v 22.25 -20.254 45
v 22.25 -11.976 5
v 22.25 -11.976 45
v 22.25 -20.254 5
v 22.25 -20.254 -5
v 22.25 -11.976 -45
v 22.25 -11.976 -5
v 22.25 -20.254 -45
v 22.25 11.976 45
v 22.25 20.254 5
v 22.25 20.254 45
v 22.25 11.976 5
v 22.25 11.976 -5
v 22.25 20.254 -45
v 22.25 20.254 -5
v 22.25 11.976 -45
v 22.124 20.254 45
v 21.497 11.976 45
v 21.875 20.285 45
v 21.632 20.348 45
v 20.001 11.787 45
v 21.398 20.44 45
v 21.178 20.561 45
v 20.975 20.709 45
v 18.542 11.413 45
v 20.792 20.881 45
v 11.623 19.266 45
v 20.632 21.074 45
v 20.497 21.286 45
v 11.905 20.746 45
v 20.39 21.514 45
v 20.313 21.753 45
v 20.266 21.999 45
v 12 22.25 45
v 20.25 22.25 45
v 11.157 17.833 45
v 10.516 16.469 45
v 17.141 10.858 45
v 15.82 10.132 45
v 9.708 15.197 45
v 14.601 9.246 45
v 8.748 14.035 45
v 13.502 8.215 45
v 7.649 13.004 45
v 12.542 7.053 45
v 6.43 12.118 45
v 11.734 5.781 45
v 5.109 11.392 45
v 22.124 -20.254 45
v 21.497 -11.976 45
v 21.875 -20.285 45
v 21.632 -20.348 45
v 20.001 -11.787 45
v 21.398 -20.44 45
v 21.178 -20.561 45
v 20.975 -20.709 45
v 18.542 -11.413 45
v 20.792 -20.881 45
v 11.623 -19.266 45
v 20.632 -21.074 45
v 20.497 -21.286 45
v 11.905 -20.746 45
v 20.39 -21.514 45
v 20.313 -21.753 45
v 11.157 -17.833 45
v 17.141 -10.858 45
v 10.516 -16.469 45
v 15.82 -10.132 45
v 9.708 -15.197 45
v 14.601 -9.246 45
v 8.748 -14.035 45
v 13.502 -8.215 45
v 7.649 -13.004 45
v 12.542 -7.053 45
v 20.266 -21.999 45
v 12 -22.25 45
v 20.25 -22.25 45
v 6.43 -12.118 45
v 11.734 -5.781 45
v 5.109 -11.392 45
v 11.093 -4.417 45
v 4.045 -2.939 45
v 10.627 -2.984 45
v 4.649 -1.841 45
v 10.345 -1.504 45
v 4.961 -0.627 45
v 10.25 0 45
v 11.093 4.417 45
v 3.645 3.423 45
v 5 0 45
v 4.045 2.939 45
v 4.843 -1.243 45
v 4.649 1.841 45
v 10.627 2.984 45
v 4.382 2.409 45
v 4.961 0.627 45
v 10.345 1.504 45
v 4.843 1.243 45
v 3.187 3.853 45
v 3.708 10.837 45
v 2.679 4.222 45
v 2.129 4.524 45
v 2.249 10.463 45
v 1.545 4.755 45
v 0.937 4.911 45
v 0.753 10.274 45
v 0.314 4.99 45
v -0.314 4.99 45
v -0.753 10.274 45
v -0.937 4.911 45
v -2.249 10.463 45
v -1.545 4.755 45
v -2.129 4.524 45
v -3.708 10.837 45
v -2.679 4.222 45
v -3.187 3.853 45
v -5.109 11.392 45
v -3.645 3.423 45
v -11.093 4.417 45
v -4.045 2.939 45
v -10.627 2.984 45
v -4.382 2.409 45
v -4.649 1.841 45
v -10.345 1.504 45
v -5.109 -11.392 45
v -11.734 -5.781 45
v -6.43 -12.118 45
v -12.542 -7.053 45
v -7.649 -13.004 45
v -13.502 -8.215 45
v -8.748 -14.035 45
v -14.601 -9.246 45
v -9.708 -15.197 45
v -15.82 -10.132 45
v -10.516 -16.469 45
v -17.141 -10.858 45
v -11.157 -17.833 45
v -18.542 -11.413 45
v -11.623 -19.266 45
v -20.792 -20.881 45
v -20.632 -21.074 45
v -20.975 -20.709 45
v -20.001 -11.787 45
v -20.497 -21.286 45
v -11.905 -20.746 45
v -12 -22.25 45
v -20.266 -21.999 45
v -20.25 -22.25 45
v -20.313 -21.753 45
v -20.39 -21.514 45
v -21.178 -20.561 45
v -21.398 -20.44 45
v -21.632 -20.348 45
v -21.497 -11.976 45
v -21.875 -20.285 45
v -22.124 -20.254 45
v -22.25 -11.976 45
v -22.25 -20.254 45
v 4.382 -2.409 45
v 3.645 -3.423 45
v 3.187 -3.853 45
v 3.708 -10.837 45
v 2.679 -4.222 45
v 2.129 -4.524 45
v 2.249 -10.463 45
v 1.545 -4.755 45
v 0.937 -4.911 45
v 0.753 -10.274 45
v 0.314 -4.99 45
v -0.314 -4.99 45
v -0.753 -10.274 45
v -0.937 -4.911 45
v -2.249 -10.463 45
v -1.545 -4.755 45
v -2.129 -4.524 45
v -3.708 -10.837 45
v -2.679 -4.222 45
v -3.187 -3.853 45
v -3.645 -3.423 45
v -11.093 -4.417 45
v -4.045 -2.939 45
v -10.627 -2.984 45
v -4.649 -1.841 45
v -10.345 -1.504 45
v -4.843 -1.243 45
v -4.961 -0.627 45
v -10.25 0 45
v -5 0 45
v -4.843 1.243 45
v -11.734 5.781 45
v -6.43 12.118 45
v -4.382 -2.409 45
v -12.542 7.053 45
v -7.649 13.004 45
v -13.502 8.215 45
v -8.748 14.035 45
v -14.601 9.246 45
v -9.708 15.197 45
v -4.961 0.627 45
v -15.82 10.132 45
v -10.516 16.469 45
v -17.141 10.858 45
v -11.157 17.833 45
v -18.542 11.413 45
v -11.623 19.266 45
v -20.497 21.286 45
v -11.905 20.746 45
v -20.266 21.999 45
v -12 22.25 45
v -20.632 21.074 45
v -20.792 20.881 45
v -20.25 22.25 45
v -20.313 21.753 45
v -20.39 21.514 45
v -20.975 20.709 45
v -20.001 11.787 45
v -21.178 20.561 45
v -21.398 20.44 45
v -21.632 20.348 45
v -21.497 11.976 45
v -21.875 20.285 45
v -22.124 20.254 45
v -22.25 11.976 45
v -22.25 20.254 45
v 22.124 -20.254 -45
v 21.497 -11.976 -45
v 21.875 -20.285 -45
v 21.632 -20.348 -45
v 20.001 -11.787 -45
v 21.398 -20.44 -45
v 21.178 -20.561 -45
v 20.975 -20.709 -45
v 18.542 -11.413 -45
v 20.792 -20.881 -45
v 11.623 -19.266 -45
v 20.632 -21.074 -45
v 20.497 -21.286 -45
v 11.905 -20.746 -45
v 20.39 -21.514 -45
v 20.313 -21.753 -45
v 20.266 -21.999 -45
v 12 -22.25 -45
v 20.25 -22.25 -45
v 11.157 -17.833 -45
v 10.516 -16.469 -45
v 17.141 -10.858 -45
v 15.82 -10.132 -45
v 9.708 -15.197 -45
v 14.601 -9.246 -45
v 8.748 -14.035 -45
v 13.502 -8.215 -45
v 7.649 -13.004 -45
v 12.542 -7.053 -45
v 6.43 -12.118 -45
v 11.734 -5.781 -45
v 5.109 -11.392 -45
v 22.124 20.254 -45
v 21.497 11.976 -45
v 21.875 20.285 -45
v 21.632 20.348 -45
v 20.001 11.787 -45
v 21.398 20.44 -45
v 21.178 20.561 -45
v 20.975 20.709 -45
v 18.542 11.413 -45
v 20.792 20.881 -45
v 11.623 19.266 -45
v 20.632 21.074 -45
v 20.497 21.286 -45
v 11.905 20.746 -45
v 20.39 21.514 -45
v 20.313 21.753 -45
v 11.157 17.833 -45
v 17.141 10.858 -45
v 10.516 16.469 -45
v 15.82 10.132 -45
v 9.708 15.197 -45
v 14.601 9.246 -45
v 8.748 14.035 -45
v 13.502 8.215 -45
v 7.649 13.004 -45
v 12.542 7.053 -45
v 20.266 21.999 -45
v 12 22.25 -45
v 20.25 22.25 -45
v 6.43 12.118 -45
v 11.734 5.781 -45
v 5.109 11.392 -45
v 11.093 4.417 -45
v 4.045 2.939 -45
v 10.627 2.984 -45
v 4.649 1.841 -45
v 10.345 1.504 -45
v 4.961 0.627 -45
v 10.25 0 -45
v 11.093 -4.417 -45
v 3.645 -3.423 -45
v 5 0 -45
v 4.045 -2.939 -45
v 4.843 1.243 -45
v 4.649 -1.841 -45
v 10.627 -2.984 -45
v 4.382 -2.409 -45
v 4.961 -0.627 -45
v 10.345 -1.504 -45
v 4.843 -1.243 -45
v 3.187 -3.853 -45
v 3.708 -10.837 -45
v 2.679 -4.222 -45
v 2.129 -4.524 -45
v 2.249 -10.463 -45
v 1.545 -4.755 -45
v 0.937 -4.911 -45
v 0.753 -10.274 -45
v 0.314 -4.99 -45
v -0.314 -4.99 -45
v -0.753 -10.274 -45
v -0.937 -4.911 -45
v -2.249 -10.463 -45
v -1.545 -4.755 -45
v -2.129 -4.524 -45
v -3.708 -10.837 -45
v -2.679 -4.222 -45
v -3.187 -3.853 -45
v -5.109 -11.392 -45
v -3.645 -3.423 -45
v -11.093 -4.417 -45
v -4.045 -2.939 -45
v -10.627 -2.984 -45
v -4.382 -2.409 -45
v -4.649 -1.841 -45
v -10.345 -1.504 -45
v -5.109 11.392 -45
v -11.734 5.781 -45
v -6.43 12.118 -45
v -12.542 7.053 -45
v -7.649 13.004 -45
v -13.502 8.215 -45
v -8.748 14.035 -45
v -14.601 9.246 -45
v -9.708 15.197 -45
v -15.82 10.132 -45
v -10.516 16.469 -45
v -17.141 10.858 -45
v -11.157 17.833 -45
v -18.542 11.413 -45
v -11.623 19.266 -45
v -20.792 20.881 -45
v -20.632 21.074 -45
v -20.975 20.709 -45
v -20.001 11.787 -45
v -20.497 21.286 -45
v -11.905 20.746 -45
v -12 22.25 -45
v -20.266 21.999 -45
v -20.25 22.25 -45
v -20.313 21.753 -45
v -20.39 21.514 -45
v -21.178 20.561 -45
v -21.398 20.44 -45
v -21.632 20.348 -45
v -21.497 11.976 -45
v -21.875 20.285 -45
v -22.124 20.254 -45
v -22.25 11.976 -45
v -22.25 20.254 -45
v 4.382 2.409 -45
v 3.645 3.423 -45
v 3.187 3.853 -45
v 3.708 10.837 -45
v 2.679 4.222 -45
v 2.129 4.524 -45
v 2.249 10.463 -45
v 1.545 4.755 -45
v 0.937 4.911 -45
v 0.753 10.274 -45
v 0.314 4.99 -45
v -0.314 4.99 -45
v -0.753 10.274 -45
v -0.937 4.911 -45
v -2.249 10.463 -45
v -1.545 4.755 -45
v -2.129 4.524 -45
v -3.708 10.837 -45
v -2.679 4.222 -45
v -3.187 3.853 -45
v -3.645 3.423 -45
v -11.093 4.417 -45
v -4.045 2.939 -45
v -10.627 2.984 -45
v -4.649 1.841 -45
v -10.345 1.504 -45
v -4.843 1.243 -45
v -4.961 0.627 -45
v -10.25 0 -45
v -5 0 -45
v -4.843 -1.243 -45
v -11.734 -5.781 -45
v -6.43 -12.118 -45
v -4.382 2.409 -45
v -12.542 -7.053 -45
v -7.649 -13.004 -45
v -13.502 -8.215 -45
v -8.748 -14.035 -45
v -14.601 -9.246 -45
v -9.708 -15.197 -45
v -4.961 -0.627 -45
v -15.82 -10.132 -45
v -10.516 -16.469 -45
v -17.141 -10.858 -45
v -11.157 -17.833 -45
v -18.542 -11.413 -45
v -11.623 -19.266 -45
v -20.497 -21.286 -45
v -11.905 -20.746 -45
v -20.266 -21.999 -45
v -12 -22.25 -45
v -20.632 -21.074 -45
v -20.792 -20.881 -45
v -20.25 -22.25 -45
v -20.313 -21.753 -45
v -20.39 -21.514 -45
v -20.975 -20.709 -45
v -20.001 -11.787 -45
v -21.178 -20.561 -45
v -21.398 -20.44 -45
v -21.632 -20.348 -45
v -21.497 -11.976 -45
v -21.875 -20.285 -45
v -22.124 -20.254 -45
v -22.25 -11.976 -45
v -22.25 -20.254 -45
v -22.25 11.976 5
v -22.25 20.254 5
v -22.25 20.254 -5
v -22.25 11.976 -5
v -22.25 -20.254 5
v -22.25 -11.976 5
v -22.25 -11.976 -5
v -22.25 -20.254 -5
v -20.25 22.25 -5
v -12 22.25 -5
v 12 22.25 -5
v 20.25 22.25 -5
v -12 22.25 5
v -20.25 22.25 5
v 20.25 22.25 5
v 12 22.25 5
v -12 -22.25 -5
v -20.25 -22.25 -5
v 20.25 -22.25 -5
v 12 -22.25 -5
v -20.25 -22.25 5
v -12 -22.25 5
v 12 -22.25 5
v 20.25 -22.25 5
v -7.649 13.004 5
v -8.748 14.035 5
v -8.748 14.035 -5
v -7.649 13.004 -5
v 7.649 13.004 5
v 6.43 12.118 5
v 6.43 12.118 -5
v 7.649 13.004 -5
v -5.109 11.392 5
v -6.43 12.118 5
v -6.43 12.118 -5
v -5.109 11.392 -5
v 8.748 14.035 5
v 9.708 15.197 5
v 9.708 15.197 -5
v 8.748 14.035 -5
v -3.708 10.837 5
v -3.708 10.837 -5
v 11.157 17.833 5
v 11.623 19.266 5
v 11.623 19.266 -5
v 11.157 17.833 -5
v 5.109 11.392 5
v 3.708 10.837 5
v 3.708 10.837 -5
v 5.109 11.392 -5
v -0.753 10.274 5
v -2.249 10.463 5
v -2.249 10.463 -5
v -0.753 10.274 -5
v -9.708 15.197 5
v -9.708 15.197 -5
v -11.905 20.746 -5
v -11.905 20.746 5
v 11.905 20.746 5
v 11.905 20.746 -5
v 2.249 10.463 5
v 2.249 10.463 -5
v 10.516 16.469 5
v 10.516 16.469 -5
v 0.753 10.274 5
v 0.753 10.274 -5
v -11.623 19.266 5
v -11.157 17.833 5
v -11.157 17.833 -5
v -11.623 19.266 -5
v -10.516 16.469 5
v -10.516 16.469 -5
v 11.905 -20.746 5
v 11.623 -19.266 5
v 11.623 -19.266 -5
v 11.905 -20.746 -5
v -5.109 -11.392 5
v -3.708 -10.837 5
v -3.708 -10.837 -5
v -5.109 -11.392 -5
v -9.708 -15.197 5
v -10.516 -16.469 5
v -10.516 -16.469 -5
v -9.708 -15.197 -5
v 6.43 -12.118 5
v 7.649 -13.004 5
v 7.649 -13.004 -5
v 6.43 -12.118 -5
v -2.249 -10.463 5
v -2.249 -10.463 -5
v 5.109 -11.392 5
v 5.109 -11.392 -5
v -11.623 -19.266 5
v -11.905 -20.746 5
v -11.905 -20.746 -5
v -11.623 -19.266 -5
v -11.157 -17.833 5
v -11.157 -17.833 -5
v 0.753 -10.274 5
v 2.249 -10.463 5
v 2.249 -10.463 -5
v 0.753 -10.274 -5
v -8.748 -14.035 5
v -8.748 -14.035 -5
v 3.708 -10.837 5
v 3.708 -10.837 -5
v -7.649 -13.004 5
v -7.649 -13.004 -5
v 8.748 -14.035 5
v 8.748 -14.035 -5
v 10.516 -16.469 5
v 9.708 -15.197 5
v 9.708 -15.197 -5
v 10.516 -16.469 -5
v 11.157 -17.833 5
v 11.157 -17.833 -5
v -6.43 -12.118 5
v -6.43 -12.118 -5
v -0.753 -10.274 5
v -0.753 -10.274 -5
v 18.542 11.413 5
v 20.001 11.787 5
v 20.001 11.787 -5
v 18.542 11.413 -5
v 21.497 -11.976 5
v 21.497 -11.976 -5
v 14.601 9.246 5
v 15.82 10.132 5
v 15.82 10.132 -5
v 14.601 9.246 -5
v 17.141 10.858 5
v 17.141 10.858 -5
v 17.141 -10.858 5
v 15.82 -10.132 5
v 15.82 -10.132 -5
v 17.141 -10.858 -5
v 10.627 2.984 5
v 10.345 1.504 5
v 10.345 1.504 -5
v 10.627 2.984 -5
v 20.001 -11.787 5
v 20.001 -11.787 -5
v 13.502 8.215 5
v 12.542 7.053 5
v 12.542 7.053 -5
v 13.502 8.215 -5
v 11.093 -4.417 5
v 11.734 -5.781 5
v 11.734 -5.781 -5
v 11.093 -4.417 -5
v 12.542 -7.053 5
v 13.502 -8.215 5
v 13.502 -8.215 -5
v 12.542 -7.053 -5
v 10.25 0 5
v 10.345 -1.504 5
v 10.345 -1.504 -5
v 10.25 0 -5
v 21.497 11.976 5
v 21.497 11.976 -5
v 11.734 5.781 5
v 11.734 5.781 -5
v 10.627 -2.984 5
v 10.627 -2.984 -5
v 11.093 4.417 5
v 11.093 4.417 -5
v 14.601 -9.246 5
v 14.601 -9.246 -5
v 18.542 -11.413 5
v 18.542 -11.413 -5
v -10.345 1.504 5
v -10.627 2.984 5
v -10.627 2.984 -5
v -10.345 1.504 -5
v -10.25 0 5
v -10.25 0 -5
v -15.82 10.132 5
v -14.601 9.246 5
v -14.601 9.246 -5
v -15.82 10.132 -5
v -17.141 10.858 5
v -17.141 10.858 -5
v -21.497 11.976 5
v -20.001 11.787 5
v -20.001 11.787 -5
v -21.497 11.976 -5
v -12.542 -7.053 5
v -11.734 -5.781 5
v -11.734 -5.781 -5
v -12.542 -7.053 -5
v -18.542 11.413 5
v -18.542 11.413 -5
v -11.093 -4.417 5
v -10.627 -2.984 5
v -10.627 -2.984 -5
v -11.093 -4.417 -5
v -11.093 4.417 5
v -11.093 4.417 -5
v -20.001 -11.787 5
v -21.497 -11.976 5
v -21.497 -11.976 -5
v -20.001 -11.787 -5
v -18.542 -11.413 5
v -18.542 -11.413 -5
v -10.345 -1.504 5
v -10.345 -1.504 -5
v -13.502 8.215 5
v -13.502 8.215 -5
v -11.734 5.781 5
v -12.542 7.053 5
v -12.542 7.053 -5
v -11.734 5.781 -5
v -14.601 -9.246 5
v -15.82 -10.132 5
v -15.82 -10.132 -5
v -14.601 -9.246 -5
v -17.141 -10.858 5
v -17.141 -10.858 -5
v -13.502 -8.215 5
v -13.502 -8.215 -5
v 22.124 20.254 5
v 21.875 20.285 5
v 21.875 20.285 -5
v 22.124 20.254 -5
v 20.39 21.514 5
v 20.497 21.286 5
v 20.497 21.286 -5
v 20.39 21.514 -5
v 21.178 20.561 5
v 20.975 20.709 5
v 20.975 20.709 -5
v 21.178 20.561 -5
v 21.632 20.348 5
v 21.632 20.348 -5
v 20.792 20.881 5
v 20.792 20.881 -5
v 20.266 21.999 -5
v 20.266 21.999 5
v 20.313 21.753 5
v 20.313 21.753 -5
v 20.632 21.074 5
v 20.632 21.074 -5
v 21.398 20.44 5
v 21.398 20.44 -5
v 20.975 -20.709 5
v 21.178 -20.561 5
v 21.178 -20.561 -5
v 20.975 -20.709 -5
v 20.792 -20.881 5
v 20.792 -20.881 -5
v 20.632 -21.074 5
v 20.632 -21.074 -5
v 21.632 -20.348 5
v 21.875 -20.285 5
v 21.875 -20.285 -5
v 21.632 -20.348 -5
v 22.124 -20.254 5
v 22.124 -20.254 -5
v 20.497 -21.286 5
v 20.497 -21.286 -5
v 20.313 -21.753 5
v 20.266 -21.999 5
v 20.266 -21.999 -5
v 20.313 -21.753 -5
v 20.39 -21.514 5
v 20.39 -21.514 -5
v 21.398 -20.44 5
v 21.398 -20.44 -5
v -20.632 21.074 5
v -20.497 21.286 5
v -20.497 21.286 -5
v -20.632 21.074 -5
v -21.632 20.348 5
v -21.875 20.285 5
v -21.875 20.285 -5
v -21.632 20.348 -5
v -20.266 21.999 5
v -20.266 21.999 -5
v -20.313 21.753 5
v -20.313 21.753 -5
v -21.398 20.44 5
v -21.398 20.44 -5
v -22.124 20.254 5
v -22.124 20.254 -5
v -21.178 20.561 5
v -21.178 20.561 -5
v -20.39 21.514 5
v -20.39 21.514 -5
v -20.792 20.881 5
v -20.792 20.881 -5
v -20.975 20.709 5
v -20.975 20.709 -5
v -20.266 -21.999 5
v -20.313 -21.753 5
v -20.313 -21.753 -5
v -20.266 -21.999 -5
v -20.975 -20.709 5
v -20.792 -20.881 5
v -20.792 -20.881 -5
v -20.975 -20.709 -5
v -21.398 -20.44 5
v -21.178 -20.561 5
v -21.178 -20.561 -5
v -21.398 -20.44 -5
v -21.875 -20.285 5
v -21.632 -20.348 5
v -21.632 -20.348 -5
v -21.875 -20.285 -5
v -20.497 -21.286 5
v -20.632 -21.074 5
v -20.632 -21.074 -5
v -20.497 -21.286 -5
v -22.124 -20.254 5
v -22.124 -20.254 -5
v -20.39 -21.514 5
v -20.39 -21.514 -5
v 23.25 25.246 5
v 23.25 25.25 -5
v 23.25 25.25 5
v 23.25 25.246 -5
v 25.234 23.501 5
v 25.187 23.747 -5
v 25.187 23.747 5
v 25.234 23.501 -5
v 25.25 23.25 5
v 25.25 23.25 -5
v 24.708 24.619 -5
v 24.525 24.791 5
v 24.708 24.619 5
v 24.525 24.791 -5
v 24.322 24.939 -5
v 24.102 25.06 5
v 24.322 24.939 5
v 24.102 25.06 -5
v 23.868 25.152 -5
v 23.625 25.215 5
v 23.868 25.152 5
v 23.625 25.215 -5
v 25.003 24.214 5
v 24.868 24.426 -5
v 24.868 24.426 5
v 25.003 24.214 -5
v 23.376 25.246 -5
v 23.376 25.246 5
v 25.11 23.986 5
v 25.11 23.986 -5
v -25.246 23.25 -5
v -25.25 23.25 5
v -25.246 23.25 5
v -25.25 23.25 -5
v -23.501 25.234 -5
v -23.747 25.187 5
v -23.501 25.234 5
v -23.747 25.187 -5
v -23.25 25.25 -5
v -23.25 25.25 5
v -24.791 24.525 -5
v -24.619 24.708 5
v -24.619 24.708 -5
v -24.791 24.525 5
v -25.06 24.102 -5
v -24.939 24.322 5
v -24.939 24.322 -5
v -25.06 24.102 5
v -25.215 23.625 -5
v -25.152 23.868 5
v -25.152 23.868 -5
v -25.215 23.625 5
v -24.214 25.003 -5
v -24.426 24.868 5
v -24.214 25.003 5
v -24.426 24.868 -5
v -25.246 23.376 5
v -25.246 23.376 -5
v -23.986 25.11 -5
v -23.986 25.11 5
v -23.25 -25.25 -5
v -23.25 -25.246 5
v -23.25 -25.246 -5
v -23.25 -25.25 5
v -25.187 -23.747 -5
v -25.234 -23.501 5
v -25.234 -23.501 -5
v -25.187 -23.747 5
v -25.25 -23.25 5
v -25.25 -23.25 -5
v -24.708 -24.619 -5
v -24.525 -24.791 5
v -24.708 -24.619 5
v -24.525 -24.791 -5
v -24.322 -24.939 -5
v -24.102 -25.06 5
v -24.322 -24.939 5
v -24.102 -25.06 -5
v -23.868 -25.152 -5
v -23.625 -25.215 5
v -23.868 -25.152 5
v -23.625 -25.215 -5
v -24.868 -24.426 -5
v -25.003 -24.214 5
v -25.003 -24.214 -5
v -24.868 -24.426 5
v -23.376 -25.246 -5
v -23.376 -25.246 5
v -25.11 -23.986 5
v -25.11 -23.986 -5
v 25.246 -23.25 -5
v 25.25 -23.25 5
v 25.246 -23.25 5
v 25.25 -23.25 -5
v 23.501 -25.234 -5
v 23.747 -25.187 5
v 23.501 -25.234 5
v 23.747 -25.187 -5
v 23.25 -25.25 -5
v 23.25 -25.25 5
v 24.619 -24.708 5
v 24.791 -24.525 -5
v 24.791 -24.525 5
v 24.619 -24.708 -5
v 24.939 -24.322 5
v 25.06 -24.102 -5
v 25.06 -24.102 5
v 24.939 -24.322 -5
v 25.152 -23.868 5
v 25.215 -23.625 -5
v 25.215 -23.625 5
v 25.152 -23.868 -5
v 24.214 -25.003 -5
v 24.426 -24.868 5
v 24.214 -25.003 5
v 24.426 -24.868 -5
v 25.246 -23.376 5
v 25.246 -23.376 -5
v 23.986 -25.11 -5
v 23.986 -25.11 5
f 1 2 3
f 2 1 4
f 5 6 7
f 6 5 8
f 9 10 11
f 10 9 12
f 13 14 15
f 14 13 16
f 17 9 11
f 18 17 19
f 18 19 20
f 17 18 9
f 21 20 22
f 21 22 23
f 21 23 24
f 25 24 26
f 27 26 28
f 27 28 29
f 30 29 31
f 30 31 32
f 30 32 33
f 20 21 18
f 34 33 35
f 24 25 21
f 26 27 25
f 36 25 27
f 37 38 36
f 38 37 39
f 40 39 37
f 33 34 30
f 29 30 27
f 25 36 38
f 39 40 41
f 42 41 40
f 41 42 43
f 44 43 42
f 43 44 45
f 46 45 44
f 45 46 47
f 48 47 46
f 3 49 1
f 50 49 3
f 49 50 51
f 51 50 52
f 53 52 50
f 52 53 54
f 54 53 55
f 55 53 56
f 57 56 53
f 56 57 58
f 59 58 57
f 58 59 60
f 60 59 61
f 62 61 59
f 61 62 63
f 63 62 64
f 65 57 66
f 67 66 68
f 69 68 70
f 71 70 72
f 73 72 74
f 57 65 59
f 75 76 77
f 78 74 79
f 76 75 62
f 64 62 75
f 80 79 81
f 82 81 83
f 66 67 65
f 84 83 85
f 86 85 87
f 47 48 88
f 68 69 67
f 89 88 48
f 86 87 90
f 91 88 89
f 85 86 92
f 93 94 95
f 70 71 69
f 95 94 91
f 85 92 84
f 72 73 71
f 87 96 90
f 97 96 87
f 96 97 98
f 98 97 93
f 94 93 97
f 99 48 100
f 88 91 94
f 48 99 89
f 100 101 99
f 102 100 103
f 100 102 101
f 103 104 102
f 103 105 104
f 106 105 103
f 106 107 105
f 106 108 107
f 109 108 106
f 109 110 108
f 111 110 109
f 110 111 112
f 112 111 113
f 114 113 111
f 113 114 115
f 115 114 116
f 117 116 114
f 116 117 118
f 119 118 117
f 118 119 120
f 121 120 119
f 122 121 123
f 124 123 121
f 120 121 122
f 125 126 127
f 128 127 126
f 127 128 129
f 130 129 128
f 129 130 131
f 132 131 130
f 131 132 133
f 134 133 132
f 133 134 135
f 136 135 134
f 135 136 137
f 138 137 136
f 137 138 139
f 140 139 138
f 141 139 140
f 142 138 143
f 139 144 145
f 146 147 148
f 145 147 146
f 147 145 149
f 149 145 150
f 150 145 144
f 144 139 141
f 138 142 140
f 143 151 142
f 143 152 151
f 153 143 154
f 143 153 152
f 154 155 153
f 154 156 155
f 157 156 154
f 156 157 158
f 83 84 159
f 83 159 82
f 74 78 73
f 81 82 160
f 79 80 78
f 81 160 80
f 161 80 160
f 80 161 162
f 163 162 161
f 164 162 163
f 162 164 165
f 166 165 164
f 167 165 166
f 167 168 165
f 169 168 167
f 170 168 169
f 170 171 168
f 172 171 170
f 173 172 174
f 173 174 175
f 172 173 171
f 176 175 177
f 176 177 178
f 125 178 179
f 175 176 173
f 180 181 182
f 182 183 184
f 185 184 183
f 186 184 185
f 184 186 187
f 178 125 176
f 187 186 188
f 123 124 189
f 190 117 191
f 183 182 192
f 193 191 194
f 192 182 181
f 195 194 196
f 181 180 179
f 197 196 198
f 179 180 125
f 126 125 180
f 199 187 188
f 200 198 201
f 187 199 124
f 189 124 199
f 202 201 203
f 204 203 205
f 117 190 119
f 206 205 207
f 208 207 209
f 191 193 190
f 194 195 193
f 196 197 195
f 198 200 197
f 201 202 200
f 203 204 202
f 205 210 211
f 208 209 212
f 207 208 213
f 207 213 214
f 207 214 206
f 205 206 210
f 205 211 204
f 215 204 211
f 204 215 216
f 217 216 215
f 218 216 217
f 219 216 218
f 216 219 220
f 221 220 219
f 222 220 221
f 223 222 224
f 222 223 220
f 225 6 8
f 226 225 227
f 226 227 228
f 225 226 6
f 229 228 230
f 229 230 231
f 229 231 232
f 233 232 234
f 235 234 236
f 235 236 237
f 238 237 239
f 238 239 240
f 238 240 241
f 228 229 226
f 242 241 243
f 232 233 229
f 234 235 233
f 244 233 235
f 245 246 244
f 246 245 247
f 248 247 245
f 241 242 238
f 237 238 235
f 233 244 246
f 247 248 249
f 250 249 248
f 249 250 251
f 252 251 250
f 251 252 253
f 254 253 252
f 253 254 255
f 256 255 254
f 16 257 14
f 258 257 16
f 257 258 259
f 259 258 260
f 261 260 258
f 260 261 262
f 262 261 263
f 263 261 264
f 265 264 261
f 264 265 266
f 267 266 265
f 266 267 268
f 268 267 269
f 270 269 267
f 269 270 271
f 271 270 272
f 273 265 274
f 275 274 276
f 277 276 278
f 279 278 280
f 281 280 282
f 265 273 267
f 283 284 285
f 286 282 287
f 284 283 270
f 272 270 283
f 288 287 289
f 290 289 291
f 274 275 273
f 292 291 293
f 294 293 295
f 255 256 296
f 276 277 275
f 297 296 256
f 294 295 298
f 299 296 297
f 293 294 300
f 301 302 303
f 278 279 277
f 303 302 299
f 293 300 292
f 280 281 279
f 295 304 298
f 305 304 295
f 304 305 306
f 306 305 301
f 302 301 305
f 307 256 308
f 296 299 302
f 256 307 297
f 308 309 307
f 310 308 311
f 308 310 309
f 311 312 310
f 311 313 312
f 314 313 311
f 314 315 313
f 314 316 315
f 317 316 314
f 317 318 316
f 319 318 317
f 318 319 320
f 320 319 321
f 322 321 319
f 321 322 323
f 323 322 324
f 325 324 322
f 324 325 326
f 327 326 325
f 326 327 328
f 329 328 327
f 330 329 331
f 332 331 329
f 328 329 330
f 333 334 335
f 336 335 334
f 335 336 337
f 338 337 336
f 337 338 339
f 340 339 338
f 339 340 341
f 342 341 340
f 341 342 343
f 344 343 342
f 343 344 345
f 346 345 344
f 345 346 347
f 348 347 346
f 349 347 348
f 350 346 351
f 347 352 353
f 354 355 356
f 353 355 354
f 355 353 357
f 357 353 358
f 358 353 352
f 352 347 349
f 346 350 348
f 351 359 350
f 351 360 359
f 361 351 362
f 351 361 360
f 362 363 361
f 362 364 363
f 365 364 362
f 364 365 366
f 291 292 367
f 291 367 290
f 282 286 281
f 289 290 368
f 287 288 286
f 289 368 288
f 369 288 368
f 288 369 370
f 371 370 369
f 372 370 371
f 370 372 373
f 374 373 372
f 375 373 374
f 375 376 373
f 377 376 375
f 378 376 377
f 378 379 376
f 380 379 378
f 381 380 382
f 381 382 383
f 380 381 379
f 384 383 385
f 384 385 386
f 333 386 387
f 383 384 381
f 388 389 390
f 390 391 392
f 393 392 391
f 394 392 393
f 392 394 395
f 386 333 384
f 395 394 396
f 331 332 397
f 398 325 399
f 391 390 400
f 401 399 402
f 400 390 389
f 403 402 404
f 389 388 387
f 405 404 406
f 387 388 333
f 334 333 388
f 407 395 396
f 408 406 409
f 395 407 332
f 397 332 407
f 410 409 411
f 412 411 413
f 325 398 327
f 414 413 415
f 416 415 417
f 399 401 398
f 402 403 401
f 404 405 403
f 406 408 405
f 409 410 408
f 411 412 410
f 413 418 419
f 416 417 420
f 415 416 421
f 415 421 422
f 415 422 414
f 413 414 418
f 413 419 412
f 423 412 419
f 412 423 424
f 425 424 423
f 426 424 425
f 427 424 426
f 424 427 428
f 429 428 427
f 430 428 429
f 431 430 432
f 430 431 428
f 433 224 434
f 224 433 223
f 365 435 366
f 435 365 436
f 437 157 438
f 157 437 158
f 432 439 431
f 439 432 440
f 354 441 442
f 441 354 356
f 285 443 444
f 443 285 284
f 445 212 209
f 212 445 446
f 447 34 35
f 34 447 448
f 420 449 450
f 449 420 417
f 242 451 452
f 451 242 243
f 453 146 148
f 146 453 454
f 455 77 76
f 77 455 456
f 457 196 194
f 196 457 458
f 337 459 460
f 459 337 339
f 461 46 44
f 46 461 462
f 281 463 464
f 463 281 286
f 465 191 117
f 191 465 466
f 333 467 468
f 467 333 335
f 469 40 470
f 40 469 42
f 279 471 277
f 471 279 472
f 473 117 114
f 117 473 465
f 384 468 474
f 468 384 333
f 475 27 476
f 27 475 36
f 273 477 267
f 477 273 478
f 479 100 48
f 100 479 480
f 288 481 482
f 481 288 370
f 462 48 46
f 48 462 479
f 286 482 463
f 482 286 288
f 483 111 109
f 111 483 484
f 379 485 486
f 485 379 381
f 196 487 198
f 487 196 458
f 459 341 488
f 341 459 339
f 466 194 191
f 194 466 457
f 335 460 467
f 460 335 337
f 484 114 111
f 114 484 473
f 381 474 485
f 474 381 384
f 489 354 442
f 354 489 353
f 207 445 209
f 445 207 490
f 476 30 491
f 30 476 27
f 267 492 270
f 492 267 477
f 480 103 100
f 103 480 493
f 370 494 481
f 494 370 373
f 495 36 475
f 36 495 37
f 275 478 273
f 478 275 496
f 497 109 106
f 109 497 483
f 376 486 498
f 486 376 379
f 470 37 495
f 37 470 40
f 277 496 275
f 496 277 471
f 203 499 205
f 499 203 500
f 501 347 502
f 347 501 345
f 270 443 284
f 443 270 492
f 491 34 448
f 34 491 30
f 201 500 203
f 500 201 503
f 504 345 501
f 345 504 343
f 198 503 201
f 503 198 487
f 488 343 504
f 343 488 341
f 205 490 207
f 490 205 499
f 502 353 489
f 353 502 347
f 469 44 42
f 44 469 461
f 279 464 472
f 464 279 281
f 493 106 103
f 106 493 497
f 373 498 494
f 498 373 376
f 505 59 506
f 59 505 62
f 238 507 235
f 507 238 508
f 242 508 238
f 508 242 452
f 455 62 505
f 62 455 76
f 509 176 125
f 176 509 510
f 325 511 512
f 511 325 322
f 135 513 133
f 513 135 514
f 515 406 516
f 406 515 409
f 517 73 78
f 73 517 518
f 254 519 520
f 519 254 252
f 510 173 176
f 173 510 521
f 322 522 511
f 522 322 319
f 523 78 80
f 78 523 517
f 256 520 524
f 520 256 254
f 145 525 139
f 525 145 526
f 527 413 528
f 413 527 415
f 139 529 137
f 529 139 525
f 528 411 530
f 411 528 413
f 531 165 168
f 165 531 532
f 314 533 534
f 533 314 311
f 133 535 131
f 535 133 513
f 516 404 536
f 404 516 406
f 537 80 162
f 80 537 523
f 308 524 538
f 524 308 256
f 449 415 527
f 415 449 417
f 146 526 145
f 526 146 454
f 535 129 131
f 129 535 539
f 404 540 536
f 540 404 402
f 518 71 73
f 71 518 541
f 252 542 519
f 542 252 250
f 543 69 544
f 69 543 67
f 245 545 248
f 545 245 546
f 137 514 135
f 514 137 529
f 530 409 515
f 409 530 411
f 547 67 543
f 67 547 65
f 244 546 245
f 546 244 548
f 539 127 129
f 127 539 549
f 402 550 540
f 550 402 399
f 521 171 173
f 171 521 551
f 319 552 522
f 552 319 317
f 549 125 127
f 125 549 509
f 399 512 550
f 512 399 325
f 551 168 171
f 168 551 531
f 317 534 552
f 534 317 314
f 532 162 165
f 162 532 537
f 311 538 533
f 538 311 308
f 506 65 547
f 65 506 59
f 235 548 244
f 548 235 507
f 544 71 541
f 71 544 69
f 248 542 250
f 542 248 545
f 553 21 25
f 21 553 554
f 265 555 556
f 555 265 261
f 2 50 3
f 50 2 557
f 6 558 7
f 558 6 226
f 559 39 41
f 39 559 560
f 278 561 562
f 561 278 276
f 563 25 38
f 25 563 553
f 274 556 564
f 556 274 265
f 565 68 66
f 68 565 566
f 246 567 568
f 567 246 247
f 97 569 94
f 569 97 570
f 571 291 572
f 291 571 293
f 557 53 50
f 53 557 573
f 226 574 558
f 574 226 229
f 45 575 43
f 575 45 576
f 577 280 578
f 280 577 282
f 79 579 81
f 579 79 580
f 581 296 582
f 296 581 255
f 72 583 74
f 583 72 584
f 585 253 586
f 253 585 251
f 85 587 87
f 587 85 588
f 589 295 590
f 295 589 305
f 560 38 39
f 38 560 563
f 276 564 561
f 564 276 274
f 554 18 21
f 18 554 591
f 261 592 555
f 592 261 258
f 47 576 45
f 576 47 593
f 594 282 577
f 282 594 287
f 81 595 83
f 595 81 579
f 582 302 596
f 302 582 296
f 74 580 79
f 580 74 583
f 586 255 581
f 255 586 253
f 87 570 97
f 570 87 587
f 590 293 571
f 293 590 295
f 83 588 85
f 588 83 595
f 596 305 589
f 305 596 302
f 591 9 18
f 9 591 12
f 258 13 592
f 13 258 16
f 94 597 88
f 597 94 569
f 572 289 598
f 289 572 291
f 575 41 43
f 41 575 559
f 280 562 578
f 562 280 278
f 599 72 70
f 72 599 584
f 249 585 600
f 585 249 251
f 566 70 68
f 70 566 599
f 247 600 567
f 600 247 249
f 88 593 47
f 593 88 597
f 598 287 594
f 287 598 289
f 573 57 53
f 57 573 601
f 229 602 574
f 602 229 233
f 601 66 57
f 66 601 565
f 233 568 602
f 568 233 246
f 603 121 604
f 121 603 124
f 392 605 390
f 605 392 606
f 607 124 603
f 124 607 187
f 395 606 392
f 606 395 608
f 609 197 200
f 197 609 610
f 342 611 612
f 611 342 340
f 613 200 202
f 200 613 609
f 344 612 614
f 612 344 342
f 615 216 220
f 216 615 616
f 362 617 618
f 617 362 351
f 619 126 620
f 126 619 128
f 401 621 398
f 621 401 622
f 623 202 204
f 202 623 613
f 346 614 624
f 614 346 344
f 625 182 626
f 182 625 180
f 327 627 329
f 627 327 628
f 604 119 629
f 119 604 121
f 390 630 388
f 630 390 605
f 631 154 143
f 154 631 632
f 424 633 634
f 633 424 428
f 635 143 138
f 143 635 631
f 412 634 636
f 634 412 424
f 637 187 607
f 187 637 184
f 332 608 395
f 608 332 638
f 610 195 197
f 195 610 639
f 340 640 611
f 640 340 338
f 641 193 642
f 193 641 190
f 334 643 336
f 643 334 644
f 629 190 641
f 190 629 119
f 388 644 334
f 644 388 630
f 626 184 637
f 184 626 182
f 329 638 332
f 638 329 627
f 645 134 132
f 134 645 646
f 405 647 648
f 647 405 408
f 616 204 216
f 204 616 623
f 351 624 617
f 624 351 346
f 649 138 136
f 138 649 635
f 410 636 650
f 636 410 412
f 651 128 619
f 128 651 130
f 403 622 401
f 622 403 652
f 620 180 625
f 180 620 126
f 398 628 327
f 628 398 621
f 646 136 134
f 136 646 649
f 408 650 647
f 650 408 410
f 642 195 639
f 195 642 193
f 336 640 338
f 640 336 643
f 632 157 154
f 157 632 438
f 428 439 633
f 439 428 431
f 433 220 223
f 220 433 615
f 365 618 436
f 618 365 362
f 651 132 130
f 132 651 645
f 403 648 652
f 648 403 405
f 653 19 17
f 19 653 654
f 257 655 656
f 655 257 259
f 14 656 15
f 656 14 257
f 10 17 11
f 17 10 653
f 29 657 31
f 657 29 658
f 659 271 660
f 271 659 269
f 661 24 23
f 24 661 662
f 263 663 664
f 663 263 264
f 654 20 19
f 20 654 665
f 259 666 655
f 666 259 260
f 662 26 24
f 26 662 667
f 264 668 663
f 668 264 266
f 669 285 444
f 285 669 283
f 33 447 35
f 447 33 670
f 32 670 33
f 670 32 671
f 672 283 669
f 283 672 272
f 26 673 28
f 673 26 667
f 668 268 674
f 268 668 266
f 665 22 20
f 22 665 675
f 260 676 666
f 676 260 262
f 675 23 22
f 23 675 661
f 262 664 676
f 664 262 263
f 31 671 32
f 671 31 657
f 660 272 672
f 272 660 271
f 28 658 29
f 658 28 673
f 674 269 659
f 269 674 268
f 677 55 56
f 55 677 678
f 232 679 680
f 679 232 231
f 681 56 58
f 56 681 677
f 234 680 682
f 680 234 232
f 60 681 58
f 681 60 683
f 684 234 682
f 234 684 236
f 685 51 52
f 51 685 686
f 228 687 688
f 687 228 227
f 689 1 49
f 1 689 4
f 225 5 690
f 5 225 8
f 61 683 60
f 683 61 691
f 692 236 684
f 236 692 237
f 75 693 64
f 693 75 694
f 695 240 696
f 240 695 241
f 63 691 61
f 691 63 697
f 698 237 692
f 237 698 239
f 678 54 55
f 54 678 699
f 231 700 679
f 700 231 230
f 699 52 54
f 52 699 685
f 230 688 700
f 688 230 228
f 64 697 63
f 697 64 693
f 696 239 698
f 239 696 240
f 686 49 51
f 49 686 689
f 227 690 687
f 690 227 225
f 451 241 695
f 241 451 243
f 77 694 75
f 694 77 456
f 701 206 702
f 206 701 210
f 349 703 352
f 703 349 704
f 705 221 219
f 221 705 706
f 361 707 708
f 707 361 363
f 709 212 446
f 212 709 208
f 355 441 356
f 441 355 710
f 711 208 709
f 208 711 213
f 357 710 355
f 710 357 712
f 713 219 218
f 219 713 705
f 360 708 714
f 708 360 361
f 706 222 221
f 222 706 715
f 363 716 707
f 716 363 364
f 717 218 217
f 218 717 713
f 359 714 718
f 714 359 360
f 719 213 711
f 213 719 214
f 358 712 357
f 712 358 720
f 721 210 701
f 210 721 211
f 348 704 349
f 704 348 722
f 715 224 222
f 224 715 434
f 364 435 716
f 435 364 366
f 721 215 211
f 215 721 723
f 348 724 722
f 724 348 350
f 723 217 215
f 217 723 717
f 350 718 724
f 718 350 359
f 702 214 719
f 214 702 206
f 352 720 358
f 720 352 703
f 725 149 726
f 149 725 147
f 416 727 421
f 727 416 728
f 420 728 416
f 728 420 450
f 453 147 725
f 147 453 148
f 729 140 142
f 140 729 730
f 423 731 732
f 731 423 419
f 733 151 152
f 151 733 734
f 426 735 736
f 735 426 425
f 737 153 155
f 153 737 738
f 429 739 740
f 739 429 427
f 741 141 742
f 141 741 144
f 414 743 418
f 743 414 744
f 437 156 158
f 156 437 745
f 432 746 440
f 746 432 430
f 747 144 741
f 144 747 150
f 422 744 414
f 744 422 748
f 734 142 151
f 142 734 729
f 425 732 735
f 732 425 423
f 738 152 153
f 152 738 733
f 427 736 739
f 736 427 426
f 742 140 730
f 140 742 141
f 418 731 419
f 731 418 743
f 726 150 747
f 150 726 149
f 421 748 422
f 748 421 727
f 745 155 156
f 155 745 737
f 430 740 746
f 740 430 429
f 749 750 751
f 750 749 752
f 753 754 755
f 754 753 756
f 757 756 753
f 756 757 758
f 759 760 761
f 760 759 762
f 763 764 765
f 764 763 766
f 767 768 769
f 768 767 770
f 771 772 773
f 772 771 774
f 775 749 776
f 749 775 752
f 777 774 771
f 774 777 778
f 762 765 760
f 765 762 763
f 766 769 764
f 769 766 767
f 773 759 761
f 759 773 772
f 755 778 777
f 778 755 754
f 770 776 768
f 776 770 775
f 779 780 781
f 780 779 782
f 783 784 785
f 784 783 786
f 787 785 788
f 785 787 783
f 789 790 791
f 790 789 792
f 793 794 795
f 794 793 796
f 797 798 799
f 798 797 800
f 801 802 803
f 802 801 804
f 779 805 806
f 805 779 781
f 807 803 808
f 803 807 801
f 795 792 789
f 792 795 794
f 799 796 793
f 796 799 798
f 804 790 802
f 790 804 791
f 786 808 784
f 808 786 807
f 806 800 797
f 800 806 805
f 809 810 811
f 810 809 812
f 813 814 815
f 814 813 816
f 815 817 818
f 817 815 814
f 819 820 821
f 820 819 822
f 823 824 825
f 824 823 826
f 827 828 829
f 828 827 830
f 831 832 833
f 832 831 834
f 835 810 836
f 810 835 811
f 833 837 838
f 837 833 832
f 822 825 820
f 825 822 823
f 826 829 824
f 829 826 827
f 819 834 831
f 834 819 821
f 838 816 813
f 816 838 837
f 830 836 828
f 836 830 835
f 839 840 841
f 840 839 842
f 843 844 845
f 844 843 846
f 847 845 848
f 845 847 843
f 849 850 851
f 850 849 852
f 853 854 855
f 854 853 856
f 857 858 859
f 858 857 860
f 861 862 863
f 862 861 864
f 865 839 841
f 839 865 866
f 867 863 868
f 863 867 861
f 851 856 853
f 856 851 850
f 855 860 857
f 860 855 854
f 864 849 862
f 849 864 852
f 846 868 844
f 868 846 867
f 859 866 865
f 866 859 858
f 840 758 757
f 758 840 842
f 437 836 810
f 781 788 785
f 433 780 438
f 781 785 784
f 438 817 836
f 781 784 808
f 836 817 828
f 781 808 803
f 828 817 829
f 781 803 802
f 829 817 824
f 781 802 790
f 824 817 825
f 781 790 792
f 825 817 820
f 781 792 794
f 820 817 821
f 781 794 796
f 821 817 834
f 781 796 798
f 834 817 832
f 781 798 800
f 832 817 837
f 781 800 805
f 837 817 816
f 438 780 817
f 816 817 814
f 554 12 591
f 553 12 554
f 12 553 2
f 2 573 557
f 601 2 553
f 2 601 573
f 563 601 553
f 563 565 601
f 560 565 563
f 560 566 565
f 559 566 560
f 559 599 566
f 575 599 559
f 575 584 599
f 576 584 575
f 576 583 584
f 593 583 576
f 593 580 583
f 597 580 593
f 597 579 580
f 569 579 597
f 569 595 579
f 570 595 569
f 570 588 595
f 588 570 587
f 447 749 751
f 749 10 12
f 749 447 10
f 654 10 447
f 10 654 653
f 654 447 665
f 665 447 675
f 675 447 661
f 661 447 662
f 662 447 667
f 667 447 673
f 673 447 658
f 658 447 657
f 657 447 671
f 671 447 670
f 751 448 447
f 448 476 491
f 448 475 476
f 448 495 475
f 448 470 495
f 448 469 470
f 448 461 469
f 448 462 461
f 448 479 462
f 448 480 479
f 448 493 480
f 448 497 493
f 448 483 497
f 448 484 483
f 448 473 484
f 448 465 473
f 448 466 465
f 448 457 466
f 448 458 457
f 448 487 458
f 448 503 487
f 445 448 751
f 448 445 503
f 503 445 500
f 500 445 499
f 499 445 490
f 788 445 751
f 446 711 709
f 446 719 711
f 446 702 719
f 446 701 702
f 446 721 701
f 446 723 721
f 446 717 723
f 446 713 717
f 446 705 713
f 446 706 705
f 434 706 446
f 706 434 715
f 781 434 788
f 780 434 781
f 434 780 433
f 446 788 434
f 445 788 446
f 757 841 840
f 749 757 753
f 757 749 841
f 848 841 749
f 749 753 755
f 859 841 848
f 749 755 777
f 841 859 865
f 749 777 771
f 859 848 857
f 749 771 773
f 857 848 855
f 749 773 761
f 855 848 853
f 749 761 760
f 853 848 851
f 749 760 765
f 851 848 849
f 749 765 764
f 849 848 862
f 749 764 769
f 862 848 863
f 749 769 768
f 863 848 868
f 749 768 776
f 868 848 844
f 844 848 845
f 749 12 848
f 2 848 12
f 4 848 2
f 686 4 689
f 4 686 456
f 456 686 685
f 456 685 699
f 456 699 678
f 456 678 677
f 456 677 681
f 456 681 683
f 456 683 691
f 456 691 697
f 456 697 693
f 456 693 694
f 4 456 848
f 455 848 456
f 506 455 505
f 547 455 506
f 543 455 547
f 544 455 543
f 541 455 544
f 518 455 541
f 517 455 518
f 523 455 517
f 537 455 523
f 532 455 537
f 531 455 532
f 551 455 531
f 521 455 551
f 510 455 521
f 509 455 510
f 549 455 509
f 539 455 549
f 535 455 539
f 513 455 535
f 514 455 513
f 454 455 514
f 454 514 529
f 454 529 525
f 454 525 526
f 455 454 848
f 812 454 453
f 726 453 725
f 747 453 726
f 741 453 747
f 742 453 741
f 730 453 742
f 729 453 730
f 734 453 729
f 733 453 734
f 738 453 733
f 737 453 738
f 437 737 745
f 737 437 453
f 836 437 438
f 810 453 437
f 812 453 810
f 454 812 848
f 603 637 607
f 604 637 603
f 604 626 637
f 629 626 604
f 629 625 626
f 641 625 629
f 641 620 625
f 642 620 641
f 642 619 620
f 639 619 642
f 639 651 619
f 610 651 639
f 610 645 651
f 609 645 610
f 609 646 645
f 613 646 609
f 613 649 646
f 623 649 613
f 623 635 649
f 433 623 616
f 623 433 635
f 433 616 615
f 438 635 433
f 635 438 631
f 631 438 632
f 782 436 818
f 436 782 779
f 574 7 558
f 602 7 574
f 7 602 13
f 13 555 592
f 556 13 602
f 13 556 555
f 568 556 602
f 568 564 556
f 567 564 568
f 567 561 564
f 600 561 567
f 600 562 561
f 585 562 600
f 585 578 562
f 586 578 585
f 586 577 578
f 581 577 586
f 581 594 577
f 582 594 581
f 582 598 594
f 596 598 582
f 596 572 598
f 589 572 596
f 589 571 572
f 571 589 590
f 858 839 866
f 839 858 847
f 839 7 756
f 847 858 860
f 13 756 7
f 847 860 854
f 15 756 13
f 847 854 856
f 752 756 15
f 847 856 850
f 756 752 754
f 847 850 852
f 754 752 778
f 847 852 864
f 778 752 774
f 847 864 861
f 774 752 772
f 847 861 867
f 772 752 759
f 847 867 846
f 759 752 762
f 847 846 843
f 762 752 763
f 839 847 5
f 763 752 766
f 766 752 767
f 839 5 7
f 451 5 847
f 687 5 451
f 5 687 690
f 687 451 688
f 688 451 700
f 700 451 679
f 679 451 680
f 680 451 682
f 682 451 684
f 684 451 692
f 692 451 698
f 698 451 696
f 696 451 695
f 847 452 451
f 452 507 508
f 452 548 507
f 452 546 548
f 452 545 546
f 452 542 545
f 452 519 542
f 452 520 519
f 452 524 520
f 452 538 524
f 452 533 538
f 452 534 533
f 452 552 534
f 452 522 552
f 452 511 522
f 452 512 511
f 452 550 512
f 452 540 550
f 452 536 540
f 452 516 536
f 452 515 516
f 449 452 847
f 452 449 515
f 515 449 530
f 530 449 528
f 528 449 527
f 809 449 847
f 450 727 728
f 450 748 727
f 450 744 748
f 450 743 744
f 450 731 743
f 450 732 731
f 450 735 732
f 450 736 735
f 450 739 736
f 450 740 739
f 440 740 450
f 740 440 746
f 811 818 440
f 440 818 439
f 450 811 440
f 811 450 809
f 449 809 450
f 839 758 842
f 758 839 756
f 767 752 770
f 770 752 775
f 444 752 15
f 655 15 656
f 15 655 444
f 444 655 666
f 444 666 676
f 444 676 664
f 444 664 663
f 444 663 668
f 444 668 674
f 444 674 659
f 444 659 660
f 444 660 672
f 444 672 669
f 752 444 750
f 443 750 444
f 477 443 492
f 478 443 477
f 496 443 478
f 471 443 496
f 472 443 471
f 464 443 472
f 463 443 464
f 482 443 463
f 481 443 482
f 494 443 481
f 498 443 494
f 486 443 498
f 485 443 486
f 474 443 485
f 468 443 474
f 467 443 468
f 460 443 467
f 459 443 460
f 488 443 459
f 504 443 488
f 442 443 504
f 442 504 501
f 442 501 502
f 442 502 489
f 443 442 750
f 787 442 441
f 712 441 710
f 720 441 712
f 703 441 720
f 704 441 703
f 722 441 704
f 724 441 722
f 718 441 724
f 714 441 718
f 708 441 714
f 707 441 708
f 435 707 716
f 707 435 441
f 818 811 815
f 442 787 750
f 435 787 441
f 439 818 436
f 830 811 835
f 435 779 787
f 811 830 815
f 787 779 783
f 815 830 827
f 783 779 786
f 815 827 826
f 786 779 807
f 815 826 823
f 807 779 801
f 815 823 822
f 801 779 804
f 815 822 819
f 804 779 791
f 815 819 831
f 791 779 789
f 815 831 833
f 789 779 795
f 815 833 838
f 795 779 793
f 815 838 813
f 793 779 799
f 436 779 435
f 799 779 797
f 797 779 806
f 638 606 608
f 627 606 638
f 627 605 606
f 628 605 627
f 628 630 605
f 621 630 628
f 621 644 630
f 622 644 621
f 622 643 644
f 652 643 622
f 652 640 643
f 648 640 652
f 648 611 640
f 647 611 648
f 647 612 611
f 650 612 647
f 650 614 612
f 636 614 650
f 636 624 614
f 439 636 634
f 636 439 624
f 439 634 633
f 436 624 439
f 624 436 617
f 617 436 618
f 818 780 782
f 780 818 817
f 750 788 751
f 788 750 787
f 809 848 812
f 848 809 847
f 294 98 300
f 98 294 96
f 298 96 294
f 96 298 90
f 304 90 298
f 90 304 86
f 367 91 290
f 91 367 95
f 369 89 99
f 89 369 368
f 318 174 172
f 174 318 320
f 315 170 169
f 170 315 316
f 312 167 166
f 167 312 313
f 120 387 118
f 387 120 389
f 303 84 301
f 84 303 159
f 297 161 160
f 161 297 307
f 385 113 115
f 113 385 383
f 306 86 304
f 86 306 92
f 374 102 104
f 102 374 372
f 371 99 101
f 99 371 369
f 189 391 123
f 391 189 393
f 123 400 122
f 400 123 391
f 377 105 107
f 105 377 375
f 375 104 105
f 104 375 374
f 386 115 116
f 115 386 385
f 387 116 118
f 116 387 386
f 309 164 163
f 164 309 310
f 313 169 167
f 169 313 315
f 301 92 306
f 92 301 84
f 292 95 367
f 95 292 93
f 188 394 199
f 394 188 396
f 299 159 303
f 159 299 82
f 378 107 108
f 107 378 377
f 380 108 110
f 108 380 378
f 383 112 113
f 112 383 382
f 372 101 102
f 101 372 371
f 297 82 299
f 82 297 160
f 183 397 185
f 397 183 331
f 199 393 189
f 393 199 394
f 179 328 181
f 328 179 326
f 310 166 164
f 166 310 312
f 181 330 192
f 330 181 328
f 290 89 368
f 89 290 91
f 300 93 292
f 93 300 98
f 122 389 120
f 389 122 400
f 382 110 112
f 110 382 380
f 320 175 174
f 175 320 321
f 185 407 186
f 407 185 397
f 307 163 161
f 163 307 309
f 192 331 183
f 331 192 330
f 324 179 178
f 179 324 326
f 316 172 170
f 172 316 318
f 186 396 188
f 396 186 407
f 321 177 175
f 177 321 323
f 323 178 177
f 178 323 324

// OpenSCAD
$fn=50;

$plateHeight = 10;
$insideHeight = 40;

$outside = 50.5;
$inside = $outside-2*3;

difference() {
    union () {
        difference() {
            // main block
            cube([$inside,$inside,$insideHeight*2+$plateHeight], true);

            // side cutouts
            $sideCutoutRadius=12;
            translate([0,$inside/2,0]) 
                cylinder($insideHeight*2+$plateHeight+2,$sideCutoutRadius,$sideCutoutRadius, true);
            translate([0,-$inside/2,0]) 
                cylinder($insideHeight*2+$plateHeight+2,$sideCutoutRadius,$sideCutoutRadius, true);
            translate([$inside/2,0,0]) 
                cylinder($insideHeight*2+$plateHeight+2,$sideCutoutRadius,$sideCutoutRadius, true);
            translate([-$inside/2,0,0]) 
                cylinder($insideHeight*2+$plateHeight+2,$sideCutoutRadius,$sideCutoutRadius, true);
            
            // corner cutouts
            $cornerCutoutRadius=2;
            translate([$inside/2,$inside/2,0]) 
                cylinder($insideHeight*2+$plateHeight+2,$cornerCutoutRadius,$cornerCutoutRadius, true);
            translate([$inside/2,-$inside/2,0])
                cylinder($insideHeight*2+$plateHeight+2,$cornerCutoutRadius,$cornerCutoutRadius, true);
            translate([-$inside/2,$inside/2,0])
                cylinder($insideHeight*2+$plateHeight+2,$cornerCutoutRadius,$cornerCutoutRadius, true);
            translate([-$inside/2,-$inside/2,0])
                cylinder($insideHeight*2+$plateHeight+2,$cornerCutoutRadius,$cornerCutoutRadius, true);
        }

        // center plate
        difference() {
            translate([0,0,0]) cube([$outside,$outside,$plateHeight], true);
            
            $cornerRadius=2;
            translate([$outside/2,$outside/2,0]) corner($cornerRadius, $plateHeight);
            translate([-$outside/2,$outside/2,0]) rotate([0,0,90]) corner($cornerRadius, $plateHeight);
            translate([-$outside/2,-$outside/2,0]) rotate([0,0,180]) corner($cornerRadius, $plateHeight);
            translate([$outside/2,-$outside/2,0]) rotate([0,0,270]) corner($cornerRadius, $plateHeight);
        }
    }
    // center cutout
    $centerRadius=5;
    translate([0,0,0]) cylinder($insideHeight*2+$plateHeight+2,$centerRadius,$centerRadius, true);
}

module corner ($radius, $height) {
    difference() {
        cube([$radius*2,$radius*2,$height+2], true);
        translate([-$radius,-$radius,0])
            cylinder($height+2, $radius, $radius, true);
    }
}
